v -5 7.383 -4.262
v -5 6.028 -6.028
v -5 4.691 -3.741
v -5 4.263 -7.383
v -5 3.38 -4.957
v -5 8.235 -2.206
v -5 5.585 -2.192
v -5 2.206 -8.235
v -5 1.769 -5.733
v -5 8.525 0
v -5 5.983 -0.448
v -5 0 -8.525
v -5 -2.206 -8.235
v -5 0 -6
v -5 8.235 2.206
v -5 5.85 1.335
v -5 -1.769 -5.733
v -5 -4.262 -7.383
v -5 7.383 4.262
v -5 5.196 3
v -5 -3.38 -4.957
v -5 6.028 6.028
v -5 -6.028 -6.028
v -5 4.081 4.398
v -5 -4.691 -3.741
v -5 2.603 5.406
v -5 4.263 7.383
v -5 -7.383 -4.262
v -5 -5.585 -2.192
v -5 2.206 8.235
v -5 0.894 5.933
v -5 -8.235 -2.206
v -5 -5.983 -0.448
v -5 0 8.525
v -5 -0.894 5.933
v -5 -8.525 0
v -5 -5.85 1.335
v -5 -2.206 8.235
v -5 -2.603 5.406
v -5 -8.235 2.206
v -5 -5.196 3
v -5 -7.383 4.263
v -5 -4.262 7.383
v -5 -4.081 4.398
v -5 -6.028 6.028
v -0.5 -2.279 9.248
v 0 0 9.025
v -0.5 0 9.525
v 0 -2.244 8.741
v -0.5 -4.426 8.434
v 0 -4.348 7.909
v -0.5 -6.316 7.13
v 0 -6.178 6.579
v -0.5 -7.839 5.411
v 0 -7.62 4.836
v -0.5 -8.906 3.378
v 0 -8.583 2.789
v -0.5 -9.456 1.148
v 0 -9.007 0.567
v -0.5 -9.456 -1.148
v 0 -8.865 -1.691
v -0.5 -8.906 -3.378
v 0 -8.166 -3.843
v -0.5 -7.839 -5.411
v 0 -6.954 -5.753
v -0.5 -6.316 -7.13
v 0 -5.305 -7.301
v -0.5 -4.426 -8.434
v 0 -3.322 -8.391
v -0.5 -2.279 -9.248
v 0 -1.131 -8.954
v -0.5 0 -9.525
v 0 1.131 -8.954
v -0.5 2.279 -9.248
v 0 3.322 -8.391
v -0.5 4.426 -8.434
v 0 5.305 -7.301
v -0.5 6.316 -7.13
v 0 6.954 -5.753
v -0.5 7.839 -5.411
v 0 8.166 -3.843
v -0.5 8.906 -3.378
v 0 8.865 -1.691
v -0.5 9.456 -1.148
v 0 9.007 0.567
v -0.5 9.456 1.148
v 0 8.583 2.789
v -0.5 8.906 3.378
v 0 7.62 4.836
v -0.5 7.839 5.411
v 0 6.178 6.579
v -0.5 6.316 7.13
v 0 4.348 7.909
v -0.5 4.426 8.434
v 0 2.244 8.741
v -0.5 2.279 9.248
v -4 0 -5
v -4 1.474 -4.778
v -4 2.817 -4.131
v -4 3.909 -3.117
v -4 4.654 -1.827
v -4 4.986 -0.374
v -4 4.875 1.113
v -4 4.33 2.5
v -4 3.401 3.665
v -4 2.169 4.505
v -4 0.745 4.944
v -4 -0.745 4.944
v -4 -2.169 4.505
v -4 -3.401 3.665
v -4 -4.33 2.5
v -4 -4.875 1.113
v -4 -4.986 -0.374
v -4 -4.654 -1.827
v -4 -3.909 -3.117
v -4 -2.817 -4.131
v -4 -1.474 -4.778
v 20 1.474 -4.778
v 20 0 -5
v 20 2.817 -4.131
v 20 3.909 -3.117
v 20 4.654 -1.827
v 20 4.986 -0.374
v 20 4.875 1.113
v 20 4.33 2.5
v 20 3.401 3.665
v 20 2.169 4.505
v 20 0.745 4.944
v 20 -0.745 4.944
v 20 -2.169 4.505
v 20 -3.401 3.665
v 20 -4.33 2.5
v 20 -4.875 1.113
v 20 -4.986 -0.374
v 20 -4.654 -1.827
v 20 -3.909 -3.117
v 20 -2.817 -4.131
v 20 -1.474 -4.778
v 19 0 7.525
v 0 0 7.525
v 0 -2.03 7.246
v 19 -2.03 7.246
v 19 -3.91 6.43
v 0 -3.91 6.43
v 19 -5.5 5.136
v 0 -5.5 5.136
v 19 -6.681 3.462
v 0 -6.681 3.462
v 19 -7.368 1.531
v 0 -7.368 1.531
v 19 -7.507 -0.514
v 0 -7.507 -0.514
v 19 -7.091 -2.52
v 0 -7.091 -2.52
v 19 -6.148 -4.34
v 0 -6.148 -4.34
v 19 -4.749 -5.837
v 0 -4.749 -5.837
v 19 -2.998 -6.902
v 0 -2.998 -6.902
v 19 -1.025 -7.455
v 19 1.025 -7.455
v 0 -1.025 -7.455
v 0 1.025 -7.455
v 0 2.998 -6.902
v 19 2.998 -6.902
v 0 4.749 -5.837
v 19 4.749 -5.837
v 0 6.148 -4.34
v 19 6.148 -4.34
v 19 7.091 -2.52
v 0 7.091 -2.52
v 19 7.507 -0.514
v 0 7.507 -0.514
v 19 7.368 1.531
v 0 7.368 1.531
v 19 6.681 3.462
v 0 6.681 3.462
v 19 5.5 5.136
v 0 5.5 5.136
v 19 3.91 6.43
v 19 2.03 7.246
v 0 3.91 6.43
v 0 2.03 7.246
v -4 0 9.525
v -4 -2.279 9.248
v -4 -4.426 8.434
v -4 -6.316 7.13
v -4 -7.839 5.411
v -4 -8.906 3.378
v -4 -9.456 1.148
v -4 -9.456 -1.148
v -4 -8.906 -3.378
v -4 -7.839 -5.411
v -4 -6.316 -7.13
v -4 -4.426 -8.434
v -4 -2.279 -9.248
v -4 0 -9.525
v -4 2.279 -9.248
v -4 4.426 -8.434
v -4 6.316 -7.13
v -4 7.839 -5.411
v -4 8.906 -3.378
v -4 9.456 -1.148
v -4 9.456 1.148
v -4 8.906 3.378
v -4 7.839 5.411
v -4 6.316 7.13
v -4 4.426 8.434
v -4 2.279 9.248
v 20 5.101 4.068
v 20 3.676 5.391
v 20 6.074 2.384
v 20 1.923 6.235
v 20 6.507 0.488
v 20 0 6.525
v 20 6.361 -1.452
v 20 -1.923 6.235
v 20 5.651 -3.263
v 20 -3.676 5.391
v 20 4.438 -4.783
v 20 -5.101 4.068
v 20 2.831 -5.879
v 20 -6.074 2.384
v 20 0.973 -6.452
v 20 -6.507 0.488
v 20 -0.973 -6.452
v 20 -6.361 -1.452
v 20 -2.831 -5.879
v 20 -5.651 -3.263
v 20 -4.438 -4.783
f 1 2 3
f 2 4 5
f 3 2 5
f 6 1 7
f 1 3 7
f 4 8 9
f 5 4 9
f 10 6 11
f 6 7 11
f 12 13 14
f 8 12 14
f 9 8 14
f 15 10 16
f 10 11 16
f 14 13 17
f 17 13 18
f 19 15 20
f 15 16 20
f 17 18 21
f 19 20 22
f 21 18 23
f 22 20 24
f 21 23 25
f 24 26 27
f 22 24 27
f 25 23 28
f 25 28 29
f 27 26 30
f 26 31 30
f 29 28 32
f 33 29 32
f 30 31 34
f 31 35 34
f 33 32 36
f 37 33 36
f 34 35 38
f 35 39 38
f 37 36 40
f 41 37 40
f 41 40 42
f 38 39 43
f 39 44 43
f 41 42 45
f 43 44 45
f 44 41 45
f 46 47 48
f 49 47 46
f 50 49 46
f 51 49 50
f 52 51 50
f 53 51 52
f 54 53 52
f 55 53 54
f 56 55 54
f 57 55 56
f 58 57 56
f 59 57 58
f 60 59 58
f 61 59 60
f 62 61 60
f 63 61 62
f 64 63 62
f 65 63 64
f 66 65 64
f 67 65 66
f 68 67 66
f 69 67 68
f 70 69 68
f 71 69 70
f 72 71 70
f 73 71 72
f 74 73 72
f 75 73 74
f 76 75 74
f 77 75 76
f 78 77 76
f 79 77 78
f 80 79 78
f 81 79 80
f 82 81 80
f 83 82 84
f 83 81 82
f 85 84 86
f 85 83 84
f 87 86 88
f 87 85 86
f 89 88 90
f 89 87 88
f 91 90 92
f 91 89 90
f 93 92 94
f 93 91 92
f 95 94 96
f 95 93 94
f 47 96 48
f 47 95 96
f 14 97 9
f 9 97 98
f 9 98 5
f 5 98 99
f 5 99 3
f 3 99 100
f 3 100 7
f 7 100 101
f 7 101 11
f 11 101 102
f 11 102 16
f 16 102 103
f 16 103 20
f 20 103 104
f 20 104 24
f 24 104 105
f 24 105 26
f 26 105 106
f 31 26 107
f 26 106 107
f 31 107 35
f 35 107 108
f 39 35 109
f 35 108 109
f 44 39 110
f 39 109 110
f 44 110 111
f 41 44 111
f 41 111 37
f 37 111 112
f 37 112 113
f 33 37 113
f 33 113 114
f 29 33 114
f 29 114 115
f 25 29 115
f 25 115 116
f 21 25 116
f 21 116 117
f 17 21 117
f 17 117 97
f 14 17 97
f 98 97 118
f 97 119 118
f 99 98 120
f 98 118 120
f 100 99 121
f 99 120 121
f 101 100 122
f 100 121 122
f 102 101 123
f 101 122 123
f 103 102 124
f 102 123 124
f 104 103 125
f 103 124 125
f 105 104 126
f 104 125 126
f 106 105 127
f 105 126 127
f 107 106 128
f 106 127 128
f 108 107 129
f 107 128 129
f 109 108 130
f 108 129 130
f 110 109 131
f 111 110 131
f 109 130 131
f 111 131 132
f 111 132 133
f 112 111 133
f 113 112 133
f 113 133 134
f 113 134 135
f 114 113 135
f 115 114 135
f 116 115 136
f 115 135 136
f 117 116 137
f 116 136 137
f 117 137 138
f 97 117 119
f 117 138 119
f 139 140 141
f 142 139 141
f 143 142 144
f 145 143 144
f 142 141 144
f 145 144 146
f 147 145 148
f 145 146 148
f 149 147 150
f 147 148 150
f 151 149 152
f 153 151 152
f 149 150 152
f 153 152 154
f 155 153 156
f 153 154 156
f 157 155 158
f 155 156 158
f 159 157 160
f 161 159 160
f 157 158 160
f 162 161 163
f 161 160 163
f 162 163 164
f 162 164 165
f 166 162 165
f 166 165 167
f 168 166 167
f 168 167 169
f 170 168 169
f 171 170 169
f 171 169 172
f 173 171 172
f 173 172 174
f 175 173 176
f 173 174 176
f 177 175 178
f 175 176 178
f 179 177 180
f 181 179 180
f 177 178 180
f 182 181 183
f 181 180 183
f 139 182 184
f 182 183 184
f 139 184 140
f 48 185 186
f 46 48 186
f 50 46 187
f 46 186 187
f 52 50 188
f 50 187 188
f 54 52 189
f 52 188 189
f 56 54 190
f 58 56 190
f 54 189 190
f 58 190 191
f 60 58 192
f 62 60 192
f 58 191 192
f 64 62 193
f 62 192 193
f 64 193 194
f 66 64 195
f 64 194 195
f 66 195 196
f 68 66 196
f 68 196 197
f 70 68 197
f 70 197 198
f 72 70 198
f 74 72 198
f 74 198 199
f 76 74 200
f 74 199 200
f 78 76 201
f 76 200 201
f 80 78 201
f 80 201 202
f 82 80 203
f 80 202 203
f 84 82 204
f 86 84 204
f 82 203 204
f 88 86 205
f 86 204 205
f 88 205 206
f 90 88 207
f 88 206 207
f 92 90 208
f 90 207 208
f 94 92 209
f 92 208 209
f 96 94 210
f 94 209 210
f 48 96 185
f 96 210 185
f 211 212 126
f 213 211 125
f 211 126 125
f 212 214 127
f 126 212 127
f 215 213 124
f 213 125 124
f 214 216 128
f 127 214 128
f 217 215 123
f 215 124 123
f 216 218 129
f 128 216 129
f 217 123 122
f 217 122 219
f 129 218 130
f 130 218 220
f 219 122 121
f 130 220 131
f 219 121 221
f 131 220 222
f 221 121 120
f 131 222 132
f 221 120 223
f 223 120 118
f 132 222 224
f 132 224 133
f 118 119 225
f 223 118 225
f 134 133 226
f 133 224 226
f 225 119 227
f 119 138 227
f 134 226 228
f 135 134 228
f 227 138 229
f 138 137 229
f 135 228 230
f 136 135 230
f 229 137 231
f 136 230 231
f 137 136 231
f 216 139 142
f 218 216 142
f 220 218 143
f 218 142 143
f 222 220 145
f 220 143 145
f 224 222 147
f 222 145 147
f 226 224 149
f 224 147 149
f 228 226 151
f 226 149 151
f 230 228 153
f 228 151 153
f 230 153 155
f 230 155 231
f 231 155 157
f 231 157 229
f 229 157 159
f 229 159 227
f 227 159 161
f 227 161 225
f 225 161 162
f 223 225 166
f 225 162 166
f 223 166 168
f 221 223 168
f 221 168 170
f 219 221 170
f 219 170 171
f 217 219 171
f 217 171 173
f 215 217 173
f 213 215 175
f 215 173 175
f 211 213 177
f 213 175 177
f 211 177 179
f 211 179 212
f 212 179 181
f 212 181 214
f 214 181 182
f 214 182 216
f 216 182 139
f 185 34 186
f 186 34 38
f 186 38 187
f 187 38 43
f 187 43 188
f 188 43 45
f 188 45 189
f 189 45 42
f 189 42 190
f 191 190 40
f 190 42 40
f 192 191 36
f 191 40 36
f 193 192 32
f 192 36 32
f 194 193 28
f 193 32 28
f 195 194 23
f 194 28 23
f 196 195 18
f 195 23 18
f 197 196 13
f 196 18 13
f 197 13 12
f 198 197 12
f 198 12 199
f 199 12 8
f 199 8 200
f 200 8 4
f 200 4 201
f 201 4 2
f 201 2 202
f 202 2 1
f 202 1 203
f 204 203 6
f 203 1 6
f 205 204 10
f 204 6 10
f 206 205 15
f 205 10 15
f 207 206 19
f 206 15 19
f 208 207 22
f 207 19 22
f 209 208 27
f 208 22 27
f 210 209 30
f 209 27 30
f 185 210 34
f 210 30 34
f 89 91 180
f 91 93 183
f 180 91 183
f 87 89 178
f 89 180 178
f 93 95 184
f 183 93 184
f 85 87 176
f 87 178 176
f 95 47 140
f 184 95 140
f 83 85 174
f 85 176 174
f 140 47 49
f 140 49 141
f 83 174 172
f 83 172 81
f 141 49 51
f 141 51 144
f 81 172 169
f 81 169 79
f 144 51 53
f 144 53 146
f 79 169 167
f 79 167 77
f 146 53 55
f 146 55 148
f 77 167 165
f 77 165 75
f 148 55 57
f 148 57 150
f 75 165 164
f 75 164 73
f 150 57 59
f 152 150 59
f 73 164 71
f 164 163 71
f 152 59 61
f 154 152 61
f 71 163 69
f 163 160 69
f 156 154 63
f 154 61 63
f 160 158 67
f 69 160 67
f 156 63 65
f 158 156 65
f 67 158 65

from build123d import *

# Parameters (mm, degrees)
CHAMFER1_SIZE                = 1
CHAMFER2_SIZE                = 0.5
M10_TAPPED_HOLE1_D           = 10
M10_TAPPED_HOLE1_CSINK_D     = 12
M10_TAPPED_HOLE1_CSINK_ANGLE = 90


with BuildPart() as part:
    # Sketch1 → Revolve1 (revolve)
    with BuildSketch(Plane.XY):
        Polygon((0, 9.525), (-5, 9.525), (-5, 0), (20, 0), (20, 7.525), (0, 7.525), align=None)
    revolve(axis=Axis((-15.231671031, 0, 0), (1, 0, 0)))

    # Chamfer1
    chamfer1_edges = [part.edges().sort_by_distance(p)[0] for p in [
        (-5, -9.525, 0),
        (20, -7.525, 0),
    ]]
    chamfer(chamfer1_edges, length=CHAMFER1_SIZE)

    # Chamfer2
    chamfer2_edges = [part.edges().sort_by_distance(p)[0] for p in [
        (0, -9.525, 0),
    ]]
    chamfer(chamfer2_edges, length=CHAMFER2_SIZE)

    # M10 Tapped Hole1 (through all)
    with Locations(Plane.ZY.offset(5)):
        with Locations((0, 0)):
            CounterSinkHole(M10_TAPPED_HOLE1_D / 2, M10_TAPPED_HOLE1_CSINK_D / 2, counter_sink_angle=M10_TAPPED_HOLE1_CSINK_ANGLE)


solid = part.part
